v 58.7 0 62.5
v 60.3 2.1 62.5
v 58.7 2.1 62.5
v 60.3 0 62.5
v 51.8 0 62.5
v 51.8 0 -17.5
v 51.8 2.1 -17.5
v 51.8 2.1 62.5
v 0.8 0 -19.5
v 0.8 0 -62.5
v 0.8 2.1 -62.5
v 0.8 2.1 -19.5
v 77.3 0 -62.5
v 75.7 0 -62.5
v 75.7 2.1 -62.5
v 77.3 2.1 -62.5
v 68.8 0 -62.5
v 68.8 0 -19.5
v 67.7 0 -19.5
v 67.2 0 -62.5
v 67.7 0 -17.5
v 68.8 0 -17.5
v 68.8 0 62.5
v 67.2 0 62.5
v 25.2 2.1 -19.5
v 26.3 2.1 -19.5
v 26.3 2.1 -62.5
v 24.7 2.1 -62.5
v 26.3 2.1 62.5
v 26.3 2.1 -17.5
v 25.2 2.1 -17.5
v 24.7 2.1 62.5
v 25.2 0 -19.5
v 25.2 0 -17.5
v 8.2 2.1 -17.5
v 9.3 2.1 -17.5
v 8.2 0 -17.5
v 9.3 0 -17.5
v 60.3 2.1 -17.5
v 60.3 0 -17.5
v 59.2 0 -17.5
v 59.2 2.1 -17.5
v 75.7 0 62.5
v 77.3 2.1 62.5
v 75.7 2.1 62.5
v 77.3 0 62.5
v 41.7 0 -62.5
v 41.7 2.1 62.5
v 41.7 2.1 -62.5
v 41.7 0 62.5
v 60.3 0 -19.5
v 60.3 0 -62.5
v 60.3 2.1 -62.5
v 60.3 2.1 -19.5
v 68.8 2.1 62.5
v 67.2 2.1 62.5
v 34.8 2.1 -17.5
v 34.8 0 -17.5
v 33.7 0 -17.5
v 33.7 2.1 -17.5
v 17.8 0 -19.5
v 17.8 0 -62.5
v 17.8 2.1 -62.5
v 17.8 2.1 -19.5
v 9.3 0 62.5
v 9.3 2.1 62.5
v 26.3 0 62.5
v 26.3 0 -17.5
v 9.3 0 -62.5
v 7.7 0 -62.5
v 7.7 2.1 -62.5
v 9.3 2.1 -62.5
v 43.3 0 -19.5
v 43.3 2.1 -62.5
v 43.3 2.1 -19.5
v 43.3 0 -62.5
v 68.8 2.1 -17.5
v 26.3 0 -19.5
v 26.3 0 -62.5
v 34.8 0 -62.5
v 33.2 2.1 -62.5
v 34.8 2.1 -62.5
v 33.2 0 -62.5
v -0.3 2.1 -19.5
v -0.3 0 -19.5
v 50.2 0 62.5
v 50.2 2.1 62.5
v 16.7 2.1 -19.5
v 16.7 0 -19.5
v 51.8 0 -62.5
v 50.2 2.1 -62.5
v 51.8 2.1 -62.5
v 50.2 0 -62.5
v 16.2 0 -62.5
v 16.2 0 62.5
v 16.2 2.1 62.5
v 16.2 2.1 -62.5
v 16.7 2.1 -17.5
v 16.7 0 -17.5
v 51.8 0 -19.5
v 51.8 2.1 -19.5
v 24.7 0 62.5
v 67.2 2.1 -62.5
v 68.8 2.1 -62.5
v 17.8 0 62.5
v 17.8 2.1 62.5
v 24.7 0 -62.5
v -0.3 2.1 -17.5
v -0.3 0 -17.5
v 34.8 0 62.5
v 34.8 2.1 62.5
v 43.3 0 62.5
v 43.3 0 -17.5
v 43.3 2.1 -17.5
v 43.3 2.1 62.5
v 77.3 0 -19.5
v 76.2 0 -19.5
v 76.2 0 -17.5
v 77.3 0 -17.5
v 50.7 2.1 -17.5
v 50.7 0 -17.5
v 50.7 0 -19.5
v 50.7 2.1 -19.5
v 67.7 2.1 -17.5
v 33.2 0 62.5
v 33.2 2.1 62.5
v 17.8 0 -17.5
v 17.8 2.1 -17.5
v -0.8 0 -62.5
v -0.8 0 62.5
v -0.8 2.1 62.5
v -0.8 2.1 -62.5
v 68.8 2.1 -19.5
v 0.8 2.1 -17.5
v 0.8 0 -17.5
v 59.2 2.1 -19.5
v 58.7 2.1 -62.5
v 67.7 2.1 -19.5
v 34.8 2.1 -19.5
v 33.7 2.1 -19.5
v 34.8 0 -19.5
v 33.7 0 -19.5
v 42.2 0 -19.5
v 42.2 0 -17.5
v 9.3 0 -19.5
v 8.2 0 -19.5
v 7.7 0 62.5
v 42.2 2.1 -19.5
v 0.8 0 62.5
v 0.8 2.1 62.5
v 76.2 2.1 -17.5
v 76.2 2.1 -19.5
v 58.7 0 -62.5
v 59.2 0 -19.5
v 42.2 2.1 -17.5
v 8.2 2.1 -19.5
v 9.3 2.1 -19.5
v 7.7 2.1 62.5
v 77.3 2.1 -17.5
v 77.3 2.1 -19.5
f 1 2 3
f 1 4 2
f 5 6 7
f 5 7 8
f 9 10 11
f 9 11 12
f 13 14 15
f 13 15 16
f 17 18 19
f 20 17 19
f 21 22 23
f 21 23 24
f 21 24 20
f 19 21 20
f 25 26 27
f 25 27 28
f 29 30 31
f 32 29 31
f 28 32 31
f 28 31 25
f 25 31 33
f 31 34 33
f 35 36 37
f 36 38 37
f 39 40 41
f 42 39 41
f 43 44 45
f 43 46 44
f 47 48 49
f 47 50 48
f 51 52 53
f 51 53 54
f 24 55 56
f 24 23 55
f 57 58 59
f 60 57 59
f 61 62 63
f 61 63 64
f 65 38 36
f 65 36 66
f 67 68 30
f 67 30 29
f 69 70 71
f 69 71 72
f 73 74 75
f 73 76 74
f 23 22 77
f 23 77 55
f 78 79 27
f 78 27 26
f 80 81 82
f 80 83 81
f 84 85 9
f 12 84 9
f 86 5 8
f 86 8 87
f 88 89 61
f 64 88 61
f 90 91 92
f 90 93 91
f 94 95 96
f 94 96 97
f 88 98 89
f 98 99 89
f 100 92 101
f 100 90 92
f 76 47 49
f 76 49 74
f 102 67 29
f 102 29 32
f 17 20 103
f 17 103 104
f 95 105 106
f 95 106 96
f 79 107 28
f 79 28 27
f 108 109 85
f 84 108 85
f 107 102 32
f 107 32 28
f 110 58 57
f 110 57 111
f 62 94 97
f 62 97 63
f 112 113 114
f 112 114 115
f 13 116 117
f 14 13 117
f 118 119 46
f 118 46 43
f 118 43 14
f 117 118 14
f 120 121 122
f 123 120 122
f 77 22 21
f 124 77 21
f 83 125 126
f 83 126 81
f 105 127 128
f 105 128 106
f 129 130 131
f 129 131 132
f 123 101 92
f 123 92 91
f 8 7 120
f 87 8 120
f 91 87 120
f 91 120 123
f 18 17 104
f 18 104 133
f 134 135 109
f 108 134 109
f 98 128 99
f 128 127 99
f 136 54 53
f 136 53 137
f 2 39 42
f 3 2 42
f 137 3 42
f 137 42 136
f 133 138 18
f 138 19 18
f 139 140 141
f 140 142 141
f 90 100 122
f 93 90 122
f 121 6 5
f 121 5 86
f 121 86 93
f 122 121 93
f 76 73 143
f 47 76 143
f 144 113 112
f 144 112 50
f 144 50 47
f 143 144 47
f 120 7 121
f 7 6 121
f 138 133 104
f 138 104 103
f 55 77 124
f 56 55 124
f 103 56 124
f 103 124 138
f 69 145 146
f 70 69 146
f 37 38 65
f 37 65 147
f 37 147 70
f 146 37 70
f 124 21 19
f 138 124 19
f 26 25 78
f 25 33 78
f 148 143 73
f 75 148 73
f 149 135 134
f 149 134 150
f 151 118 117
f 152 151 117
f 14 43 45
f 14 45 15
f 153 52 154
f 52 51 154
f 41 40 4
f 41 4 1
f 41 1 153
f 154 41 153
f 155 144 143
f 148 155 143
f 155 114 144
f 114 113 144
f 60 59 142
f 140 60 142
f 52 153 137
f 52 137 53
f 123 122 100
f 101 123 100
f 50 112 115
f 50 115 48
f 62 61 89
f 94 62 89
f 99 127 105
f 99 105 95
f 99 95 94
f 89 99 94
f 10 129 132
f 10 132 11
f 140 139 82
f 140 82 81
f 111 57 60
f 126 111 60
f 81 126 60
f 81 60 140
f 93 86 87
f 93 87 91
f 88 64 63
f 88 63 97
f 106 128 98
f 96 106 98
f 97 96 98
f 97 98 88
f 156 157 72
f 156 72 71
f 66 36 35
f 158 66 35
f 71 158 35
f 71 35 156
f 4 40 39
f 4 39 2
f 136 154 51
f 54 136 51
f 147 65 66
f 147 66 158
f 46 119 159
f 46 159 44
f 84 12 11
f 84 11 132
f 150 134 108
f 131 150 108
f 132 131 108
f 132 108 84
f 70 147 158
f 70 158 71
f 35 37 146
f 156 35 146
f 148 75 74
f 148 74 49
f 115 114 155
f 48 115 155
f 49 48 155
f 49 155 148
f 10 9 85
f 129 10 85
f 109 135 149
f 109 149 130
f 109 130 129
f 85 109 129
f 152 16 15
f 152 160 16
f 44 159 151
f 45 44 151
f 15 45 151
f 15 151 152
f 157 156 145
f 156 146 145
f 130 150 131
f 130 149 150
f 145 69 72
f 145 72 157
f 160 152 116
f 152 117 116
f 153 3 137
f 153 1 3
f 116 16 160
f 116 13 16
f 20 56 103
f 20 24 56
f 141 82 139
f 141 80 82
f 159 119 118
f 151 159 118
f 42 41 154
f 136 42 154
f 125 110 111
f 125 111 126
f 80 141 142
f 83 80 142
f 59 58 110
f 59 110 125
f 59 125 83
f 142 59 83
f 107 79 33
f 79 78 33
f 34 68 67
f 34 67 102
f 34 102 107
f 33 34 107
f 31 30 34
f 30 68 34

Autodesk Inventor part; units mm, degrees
ref_plane "YZ Plane" through (0, 0, 0) normal (1, 0, 0) x (0, 1, 0)
ref_plane "XZ Plane" through (0, 0, 0) normal (0, 1, 0) x (-1, 0, 0)
ref_plane "XY Plane" through (0, 0, 0) normal (0, 0, 1) x (1, 0, 0)
sketch "Sketch1" plane through (0, 0, 0) normal (0, 1, 0) x (-1, 0, 0)
  line L0 (0.8, -62.5) -> (-0.8, -62.5)
  line L1 (-0.8, -62.5) -> (-0.8, 62.5)
  line L2 (-0.8, 62.5) -> (0.8, 62.5)
  line L3 (0.8, 62.5) -> (0.8, -62.5)
  line L4 (0.8, -62.5) -> (-0.8, 62.5) construction
  line L5 (-0.8, -62.5) -> (0.8, 62.5) construction
  line L6 (-0.8, -17.5) -> (0.3, -17.5)
  line L7 (0.3, -17.5) -> (0.3, -19.5)
  line L8 (0.3, -19.5) -> (-0.8, -19.5)
  line L9 (-0.8, -19.5) -> (-0.8, -17.5)
  point P0 (0, 0)
  point P1 (-0.8, -19.5)
  dimension "d0" = 125
  dimension "d1" = 1.6
  dimension "d3" = 2
  dimension "d4" = 80
  dimension "d10" = 0.5
extrude "Extrusion1" add sketch "Sketch1" along normal blind 2.1 contours L0 L1 L8 L7 L6 L2 L3
pattern_linear "Rectangular Pattern1" count 10 spacing 8.5 along (1, 0, 0) of "Extrusion1"
equation "\"base_add\" = 0.6"
properties part number "structure3"
